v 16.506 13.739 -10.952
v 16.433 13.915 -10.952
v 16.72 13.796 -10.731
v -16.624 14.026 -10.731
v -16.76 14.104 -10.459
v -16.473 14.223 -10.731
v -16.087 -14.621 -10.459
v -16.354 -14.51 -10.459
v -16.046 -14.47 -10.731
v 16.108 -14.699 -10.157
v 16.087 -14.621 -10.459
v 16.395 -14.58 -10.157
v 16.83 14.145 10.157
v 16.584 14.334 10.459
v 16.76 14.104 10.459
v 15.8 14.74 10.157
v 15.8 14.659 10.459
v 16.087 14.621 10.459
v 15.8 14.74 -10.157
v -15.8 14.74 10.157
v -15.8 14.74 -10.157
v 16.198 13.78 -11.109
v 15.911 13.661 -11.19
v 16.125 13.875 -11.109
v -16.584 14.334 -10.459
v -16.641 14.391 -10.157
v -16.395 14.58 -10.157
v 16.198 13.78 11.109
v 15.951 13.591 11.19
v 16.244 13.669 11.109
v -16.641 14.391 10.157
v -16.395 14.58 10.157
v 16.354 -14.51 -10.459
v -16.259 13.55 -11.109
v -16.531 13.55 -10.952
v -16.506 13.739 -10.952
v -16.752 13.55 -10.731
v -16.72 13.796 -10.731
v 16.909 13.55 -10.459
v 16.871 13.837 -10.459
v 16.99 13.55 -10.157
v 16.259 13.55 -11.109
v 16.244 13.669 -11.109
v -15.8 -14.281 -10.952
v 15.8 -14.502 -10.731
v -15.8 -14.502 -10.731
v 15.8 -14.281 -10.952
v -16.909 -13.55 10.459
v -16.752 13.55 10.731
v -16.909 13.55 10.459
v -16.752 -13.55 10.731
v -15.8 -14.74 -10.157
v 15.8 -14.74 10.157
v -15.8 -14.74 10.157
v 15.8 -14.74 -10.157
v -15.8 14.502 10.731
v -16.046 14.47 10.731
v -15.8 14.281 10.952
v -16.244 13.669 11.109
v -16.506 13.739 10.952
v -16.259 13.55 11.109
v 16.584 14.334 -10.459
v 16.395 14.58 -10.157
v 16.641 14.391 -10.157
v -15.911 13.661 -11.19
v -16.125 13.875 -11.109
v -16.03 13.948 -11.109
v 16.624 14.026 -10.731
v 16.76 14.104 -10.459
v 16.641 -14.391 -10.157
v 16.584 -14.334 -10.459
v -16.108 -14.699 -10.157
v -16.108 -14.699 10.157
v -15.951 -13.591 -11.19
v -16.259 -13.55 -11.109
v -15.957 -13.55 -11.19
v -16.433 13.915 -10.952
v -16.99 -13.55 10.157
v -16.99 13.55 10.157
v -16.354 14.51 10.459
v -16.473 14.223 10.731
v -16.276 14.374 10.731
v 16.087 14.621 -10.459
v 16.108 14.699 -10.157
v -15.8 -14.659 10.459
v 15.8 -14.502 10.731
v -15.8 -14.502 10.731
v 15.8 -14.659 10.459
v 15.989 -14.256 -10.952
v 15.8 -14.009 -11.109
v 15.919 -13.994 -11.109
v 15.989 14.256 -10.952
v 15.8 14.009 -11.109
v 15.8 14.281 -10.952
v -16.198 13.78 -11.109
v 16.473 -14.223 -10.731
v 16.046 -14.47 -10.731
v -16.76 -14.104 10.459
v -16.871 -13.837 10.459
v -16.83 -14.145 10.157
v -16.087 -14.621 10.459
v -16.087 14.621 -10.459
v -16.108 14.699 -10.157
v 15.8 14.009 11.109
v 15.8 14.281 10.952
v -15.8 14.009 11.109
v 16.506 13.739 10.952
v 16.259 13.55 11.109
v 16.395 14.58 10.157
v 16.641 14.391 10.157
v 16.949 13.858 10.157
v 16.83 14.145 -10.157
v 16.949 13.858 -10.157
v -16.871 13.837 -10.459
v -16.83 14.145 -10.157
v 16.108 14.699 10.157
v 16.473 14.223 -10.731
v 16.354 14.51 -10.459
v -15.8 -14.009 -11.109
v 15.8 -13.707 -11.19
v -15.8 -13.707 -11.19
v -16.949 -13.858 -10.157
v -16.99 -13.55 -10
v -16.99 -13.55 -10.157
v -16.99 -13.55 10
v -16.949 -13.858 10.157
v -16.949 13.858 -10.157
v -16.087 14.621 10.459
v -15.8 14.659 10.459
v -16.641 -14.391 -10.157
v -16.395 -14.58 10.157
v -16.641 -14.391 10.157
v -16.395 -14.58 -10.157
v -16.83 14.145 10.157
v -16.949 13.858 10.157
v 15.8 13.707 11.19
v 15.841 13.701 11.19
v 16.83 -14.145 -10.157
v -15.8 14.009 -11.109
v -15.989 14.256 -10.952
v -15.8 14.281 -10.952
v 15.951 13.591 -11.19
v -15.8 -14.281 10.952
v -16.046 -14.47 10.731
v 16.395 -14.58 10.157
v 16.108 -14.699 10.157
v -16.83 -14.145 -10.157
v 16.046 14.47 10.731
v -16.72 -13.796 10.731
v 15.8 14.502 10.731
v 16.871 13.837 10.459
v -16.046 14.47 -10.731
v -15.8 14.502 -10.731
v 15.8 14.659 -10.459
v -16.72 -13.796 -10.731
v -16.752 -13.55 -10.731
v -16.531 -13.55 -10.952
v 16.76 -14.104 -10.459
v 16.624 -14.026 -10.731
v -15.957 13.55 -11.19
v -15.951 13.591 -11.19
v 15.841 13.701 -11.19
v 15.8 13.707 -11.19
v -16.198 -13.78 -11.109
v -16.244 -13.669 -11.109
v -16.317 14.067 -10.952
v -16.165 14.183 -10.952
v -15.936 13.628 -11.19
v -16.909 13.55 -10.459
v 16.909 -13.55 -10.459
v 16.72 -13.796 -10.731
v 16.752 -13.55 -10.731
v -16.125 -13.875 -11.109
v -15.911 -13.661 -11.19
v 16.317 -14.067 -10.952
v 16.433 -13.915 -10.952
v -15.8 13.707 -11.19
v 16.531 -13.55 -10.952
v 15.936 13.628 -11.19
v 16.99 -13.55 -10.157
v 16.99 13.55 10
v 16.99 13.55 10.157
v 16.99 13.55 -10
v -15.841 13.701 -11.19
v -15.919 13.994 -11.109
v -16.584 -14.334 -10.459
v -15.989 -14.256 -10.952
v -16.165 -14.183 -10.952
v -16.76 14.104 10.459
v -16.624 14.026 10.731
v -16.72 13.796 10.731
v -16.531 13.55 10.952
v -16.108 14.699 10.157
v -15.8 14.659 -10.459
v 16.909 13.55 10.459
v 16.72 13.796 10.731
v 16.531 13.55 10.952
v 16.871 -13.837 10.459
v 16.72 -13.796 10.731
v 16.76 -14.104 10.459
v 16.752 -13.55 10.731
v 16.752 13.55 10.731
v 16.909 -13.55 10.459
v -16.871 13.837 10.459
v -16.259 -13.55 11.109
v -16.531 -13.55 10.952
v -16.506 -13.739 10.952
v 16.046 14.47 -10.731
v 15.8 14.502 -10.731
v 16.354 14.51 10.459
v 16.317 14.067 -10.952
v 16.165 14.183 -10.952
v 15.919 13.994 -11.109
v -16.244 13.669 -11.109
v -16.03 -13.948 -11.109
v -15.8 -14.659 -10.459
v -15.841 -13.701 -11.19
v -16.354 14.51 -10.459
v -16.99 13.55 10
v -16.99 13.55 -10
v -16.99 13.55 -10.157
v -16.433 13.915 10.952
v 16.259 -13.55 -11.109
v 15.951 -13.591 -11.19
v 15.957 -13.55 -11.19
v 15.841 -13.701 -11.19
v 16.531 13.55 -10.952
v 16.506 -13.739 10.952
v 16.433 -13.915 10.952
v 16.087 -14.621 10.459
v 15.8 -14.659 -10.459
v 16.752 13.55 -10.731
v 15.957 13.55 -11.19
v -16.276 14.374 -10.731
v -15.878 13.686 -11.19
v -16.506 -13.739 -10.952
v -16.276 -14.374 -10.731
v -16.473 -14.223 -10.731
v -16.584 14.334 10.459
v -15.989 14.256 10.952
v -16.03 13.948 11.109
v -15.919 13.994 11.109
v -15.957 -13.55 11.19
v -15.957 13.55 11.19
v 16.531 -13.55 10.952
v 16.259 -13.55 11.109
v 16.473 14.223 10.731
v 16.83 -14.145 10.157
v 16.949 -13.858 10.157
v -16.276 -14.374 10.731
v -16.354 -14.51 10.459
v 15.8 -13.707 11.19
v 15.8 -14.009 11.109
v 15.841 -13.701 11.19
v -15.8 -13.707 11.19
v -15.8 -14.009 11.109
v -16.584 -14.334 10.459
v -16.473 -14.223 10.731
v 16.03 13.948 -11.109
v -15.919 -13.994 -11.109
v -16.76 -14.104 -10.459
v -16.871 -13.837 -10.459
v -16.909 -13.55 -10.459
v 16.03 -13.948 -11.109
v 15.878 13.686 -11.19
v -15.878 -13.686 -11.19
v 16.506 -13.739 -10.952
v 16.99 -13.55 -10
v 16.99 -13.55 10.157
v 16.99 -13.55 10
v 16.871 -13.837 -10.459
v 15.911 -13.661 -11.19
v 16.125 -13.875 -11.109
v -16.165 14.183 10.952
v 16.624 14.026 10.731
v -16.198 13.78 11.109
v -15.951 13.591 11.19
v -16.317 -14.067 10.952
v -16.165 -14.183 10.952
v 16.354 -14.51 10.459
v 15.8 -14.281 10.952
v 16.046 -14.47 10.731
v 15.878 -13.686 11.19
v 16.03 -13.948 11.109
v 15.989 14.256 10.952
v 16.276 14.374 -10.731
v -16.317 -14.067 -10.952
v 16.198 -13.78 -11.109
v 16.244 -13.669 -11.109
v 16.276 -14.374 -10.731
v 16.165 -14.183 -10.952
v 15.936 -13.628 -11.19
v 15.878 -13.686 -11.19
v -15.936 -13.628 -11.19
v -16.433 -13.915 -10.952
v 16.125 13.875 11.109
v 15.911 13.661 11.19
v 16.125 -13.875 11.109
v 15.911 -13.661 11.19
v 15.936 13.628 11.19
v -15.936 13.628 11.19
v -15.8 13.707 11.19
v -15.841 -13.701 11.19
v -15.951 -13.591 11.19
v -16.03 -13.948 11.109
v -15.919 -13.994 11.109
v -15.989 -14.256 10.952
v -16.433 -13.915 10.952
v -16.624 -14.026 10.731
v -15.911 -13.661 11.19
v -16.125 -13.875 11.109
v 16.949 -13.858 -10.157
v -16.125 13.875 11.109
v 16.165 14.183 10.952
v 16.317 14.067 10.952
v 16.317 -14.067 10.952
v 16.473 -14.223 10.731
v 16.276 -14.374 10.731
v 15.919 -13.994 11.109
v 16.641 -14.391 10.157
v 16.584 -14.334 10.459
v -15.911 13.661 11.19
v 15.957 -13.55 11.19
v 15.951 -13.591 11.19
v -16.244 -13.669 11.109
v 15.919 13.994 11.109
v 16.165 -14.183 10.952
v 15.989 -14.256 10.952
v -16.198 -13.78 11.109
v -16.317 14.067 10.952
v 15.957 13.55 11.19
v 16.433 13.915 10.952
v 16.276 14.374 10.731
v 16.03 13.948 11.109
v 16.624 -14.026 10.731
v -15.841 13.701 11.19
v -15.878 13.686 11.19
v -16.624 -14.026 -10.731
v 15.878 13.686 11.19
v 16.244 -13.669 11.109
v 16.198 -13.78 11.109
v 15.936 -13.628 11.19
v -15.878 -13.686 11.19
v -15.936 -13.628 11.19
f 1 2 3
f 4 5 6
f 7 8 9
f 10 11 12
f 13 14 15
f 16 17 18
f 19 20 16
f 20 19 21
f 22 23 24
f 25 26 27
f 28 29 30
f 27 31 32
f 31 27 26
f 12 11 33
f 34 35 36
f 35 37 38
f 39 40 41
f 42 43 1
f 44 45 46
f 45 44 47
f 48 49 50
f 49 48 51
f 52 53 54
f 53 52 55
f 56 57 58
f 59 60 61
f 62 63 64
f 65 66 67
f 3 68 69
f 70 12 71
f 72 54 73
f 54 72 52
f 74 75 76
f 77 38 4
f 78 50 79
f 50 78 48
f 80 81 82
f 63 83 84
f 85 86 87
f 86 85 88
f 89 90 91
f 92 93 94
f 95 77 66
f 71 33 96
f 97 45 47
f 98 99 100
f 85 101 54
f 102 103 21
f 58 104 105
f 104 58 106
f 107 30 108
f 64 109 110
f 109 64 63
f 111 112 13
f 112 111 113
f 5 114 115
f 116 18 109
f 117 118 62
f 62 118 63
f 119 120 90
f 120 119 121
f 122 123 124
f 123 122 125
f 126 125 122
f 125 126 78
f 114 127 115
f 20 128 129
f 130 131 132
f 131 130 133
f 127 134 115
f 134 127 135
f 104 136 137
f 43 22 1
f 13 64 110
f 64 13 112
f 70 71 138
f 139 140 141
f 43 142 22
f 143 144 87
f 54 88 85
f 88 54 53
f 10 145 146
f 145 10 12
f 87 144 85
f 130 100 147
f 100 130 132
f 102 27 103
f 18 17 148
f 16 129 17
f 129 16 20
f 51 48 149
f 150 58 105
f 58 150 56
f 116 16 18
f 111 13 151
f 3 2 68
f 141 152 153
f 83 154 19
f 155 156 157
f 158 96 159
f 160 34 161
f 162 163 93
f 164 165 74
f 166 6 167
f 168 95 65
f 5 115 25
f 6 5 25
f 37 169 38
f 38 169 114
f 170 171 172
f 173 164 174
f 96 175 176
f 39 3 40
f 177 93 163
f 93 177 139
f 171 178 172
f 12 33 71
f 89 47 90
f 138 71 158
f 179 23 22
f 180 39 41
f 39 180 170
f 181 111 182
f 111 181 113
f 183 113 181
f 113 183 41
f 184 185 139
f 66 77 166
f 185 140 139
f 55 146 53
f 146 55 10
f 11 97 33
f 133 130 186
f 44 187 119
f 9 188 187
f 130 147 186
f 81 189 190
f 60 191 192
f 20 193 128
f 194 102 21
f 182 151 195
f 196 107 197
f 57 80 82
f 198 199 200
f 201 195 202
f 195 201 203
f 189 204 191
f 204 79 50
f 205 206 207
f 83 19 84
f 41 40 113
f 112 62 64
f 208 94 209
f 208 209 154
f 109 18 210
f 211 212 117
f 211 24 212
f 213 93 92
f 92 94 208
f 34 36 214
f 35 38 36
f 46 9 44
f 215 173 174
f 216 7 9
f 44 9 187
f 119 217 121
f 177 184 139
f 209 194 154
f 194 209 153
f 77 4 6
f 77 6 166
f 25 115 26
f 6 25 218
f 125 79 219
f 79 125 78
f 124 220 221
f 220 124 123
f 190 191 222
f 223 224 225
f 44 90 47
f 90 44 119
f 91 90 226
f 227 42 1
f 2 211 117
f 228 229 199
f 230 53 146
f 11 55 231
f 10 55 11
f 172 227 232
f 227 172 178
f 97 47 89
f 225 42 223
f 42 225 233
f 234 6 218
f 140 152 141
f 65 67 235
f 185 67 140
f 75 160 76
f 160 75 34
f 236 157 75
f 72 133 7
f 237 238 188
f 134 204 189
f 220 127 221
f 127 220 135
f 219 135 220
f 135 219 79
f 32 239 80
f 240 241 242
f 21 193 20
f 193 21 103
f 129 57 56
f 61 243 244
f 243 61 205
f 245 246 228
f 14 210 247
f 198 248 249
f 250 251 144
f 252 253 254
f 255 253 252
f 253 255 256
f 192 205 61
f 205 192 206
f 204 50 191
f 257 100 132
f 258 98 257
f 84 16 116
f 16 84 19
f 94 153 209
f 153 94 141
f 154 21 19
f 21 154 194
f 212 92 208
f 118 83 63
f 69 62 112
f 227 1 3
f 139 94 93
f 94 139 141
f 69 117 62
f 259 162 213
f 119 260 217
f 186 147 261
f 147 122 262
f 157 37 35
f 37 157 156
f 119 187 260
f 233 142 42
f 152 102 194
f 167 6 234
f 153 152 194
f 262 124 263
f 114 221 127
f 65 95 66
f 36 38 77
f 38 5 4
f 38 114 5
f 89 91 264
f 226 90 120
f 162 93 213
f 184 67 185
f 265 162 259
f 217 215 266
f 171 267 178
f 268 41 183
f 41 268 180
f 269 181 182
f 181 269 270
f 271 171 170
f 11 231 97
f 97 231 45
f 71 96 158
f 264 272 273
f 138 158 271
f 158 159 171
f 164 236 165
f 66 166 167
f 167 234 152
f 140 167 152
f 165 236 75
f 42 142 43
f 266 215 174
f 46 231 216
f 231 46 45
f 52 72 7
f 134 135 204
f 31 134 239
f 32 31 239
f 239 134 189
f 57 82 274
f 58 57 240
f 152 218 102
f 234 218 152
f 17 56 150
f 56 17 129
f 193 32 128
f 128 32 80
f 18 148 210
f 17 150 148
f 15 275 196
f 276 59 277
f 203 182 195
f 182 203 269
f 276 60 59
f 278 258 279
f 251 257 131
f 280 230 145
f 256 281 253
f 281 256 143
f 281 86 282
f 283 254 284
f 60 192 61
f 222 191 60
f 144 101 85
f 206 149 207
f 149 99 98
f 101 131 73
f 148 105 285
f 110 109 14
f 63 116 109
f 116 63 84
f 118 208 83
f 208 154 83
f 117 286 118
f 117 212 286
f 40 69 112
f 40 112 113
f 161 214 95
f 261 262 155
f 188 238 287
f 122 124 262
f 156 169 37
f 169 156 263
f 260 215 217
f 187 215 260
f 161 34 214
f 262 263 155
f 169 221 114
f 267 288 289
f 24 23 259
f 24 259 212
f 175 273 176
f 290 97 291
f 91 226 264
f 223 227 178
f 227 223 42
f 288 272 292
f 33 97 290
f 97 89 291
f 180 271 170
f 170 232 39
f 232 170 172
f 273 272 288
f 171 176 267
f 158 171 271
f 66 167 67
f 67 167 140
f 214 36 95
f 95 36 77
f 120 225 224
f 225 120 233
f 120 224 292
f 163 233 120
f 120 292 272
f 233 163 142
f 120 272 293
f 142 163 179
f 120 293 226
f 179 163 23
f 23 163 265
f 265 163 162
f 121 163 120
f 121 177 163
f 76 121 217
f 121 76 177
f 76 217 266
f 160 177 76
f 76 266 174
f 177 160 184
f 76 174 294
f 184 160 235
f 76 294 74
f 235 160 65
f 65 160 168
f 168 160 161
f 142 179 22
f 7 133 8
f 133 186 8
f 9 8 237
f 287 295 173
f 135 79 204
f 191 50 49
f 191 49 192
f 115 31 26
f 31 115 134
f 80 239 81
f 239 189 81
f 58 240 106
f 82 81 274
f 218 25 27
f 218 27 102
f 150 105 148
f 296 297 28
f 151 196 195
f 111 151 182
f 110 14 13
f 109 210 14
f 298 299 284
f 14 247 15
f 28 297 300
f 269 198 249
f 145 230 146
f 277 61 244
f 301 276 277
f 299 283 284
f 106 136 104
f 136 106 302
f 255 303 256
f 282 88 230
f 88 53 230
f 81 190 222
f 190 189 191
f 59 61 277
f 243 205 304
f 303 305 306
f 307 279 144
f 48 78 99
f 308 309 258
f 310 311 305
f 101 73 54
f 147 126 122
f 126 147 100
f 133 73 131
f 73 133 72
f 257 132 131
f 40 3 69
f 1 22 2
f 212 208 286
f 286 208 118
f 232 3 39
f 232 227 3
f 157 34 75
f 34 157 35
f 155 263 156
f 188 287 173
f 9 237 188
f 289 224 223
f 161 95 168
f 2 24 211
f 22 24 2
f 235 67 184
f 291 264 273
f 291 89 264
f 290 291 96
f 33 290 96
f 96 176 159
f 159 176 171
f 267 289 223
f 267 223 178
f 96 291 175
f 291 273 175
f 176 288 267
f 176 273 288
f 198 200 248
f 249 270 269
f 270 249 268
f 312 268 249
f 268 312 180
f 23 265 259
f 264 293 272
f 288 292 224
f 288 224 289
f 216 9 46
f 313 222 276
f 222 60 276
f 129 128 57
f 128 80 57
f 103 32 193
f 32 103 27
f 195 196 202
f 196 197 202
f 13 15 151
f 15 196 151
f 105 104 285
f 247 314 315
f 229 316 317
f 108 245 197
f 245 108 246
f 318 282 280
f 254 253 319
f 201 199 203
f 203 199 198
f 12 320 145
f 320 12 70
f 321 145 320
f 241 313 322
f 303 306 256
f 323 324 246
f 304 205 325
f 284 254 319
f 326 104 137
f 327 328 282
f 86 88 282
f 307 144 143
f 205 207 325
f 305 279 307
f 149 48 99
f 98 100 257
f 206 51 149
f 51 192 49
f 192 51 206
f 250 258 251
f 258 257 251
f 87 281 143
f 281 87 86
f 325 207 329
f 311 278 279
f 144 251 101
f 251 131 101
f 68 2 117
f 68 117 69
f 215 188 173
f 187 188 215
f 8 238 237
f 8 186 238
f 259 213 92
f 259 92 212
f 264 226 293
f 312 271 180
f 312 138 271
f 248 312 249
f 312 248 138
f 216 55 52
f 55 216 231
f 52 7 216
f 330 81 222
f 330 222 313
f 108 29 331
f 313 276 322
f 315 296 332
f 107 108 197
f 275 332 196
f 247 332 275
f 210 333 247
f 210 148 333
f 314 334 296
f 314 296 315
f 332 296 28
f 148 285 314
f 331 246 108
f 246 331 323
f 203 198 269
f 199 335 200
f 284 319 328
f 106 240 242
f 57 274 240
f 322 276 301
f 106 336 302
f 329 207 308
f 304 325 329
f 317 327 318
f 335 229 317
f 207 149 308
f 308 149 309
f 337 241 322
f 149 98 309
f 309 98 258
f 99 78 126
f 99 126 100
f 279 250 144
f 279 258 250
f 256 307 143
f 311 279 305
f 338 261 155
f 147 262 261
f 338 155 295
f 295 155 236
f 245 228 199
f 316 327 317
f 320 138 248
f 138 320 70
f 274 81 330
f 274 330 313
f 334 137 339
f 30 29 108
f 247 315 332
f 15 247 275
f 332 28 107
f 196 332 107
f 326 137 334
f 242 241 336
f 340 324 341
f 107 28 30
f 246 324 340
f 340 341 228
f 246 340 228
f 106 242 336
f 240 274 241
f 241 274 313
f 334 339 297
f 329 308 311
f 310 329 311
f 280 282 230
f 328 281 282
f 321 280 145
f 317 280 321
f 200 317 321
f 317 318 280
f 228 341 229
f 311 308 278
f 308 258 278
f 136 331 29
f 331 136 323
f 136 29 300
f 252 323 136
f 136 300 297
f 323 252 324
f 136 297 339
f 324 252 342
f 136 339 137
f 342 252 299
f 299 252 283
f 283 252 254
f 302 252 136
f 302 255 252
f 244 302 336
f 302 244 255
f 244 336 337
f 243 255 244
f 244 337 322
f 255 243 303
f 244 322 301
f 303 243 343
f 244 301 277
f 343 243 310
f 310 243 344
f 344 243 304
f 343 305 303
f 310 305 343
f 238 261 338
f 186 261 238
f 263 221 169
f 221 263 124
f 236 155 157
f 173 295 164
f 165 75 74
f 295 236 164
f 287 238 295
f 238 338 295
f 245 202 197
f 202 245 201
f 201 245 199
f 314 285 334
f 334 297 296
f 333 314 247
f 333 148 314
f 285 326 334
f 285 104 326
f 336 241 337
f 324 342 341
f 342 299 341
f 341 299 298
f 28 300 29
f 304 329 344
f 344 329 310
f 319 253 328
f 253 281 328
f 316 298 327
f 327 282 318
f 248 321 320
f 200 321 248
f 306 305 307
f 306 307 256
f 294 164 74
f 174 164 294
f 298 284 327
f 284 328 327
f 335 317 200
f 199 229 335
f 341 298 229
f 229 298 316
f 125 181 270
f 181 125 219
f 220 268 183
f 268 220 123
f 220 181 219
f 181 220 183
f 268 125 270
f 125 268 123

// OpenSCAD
length=34;
height=20;
width=27.1;
thickness=1.2;
$fn=24;

difference() {

  minkowski() {
    cube([length-2*thickness, width, height], center=true);
    sphere(thickness);
  }
  cube([length+0.1, width, height], center=true);
}
